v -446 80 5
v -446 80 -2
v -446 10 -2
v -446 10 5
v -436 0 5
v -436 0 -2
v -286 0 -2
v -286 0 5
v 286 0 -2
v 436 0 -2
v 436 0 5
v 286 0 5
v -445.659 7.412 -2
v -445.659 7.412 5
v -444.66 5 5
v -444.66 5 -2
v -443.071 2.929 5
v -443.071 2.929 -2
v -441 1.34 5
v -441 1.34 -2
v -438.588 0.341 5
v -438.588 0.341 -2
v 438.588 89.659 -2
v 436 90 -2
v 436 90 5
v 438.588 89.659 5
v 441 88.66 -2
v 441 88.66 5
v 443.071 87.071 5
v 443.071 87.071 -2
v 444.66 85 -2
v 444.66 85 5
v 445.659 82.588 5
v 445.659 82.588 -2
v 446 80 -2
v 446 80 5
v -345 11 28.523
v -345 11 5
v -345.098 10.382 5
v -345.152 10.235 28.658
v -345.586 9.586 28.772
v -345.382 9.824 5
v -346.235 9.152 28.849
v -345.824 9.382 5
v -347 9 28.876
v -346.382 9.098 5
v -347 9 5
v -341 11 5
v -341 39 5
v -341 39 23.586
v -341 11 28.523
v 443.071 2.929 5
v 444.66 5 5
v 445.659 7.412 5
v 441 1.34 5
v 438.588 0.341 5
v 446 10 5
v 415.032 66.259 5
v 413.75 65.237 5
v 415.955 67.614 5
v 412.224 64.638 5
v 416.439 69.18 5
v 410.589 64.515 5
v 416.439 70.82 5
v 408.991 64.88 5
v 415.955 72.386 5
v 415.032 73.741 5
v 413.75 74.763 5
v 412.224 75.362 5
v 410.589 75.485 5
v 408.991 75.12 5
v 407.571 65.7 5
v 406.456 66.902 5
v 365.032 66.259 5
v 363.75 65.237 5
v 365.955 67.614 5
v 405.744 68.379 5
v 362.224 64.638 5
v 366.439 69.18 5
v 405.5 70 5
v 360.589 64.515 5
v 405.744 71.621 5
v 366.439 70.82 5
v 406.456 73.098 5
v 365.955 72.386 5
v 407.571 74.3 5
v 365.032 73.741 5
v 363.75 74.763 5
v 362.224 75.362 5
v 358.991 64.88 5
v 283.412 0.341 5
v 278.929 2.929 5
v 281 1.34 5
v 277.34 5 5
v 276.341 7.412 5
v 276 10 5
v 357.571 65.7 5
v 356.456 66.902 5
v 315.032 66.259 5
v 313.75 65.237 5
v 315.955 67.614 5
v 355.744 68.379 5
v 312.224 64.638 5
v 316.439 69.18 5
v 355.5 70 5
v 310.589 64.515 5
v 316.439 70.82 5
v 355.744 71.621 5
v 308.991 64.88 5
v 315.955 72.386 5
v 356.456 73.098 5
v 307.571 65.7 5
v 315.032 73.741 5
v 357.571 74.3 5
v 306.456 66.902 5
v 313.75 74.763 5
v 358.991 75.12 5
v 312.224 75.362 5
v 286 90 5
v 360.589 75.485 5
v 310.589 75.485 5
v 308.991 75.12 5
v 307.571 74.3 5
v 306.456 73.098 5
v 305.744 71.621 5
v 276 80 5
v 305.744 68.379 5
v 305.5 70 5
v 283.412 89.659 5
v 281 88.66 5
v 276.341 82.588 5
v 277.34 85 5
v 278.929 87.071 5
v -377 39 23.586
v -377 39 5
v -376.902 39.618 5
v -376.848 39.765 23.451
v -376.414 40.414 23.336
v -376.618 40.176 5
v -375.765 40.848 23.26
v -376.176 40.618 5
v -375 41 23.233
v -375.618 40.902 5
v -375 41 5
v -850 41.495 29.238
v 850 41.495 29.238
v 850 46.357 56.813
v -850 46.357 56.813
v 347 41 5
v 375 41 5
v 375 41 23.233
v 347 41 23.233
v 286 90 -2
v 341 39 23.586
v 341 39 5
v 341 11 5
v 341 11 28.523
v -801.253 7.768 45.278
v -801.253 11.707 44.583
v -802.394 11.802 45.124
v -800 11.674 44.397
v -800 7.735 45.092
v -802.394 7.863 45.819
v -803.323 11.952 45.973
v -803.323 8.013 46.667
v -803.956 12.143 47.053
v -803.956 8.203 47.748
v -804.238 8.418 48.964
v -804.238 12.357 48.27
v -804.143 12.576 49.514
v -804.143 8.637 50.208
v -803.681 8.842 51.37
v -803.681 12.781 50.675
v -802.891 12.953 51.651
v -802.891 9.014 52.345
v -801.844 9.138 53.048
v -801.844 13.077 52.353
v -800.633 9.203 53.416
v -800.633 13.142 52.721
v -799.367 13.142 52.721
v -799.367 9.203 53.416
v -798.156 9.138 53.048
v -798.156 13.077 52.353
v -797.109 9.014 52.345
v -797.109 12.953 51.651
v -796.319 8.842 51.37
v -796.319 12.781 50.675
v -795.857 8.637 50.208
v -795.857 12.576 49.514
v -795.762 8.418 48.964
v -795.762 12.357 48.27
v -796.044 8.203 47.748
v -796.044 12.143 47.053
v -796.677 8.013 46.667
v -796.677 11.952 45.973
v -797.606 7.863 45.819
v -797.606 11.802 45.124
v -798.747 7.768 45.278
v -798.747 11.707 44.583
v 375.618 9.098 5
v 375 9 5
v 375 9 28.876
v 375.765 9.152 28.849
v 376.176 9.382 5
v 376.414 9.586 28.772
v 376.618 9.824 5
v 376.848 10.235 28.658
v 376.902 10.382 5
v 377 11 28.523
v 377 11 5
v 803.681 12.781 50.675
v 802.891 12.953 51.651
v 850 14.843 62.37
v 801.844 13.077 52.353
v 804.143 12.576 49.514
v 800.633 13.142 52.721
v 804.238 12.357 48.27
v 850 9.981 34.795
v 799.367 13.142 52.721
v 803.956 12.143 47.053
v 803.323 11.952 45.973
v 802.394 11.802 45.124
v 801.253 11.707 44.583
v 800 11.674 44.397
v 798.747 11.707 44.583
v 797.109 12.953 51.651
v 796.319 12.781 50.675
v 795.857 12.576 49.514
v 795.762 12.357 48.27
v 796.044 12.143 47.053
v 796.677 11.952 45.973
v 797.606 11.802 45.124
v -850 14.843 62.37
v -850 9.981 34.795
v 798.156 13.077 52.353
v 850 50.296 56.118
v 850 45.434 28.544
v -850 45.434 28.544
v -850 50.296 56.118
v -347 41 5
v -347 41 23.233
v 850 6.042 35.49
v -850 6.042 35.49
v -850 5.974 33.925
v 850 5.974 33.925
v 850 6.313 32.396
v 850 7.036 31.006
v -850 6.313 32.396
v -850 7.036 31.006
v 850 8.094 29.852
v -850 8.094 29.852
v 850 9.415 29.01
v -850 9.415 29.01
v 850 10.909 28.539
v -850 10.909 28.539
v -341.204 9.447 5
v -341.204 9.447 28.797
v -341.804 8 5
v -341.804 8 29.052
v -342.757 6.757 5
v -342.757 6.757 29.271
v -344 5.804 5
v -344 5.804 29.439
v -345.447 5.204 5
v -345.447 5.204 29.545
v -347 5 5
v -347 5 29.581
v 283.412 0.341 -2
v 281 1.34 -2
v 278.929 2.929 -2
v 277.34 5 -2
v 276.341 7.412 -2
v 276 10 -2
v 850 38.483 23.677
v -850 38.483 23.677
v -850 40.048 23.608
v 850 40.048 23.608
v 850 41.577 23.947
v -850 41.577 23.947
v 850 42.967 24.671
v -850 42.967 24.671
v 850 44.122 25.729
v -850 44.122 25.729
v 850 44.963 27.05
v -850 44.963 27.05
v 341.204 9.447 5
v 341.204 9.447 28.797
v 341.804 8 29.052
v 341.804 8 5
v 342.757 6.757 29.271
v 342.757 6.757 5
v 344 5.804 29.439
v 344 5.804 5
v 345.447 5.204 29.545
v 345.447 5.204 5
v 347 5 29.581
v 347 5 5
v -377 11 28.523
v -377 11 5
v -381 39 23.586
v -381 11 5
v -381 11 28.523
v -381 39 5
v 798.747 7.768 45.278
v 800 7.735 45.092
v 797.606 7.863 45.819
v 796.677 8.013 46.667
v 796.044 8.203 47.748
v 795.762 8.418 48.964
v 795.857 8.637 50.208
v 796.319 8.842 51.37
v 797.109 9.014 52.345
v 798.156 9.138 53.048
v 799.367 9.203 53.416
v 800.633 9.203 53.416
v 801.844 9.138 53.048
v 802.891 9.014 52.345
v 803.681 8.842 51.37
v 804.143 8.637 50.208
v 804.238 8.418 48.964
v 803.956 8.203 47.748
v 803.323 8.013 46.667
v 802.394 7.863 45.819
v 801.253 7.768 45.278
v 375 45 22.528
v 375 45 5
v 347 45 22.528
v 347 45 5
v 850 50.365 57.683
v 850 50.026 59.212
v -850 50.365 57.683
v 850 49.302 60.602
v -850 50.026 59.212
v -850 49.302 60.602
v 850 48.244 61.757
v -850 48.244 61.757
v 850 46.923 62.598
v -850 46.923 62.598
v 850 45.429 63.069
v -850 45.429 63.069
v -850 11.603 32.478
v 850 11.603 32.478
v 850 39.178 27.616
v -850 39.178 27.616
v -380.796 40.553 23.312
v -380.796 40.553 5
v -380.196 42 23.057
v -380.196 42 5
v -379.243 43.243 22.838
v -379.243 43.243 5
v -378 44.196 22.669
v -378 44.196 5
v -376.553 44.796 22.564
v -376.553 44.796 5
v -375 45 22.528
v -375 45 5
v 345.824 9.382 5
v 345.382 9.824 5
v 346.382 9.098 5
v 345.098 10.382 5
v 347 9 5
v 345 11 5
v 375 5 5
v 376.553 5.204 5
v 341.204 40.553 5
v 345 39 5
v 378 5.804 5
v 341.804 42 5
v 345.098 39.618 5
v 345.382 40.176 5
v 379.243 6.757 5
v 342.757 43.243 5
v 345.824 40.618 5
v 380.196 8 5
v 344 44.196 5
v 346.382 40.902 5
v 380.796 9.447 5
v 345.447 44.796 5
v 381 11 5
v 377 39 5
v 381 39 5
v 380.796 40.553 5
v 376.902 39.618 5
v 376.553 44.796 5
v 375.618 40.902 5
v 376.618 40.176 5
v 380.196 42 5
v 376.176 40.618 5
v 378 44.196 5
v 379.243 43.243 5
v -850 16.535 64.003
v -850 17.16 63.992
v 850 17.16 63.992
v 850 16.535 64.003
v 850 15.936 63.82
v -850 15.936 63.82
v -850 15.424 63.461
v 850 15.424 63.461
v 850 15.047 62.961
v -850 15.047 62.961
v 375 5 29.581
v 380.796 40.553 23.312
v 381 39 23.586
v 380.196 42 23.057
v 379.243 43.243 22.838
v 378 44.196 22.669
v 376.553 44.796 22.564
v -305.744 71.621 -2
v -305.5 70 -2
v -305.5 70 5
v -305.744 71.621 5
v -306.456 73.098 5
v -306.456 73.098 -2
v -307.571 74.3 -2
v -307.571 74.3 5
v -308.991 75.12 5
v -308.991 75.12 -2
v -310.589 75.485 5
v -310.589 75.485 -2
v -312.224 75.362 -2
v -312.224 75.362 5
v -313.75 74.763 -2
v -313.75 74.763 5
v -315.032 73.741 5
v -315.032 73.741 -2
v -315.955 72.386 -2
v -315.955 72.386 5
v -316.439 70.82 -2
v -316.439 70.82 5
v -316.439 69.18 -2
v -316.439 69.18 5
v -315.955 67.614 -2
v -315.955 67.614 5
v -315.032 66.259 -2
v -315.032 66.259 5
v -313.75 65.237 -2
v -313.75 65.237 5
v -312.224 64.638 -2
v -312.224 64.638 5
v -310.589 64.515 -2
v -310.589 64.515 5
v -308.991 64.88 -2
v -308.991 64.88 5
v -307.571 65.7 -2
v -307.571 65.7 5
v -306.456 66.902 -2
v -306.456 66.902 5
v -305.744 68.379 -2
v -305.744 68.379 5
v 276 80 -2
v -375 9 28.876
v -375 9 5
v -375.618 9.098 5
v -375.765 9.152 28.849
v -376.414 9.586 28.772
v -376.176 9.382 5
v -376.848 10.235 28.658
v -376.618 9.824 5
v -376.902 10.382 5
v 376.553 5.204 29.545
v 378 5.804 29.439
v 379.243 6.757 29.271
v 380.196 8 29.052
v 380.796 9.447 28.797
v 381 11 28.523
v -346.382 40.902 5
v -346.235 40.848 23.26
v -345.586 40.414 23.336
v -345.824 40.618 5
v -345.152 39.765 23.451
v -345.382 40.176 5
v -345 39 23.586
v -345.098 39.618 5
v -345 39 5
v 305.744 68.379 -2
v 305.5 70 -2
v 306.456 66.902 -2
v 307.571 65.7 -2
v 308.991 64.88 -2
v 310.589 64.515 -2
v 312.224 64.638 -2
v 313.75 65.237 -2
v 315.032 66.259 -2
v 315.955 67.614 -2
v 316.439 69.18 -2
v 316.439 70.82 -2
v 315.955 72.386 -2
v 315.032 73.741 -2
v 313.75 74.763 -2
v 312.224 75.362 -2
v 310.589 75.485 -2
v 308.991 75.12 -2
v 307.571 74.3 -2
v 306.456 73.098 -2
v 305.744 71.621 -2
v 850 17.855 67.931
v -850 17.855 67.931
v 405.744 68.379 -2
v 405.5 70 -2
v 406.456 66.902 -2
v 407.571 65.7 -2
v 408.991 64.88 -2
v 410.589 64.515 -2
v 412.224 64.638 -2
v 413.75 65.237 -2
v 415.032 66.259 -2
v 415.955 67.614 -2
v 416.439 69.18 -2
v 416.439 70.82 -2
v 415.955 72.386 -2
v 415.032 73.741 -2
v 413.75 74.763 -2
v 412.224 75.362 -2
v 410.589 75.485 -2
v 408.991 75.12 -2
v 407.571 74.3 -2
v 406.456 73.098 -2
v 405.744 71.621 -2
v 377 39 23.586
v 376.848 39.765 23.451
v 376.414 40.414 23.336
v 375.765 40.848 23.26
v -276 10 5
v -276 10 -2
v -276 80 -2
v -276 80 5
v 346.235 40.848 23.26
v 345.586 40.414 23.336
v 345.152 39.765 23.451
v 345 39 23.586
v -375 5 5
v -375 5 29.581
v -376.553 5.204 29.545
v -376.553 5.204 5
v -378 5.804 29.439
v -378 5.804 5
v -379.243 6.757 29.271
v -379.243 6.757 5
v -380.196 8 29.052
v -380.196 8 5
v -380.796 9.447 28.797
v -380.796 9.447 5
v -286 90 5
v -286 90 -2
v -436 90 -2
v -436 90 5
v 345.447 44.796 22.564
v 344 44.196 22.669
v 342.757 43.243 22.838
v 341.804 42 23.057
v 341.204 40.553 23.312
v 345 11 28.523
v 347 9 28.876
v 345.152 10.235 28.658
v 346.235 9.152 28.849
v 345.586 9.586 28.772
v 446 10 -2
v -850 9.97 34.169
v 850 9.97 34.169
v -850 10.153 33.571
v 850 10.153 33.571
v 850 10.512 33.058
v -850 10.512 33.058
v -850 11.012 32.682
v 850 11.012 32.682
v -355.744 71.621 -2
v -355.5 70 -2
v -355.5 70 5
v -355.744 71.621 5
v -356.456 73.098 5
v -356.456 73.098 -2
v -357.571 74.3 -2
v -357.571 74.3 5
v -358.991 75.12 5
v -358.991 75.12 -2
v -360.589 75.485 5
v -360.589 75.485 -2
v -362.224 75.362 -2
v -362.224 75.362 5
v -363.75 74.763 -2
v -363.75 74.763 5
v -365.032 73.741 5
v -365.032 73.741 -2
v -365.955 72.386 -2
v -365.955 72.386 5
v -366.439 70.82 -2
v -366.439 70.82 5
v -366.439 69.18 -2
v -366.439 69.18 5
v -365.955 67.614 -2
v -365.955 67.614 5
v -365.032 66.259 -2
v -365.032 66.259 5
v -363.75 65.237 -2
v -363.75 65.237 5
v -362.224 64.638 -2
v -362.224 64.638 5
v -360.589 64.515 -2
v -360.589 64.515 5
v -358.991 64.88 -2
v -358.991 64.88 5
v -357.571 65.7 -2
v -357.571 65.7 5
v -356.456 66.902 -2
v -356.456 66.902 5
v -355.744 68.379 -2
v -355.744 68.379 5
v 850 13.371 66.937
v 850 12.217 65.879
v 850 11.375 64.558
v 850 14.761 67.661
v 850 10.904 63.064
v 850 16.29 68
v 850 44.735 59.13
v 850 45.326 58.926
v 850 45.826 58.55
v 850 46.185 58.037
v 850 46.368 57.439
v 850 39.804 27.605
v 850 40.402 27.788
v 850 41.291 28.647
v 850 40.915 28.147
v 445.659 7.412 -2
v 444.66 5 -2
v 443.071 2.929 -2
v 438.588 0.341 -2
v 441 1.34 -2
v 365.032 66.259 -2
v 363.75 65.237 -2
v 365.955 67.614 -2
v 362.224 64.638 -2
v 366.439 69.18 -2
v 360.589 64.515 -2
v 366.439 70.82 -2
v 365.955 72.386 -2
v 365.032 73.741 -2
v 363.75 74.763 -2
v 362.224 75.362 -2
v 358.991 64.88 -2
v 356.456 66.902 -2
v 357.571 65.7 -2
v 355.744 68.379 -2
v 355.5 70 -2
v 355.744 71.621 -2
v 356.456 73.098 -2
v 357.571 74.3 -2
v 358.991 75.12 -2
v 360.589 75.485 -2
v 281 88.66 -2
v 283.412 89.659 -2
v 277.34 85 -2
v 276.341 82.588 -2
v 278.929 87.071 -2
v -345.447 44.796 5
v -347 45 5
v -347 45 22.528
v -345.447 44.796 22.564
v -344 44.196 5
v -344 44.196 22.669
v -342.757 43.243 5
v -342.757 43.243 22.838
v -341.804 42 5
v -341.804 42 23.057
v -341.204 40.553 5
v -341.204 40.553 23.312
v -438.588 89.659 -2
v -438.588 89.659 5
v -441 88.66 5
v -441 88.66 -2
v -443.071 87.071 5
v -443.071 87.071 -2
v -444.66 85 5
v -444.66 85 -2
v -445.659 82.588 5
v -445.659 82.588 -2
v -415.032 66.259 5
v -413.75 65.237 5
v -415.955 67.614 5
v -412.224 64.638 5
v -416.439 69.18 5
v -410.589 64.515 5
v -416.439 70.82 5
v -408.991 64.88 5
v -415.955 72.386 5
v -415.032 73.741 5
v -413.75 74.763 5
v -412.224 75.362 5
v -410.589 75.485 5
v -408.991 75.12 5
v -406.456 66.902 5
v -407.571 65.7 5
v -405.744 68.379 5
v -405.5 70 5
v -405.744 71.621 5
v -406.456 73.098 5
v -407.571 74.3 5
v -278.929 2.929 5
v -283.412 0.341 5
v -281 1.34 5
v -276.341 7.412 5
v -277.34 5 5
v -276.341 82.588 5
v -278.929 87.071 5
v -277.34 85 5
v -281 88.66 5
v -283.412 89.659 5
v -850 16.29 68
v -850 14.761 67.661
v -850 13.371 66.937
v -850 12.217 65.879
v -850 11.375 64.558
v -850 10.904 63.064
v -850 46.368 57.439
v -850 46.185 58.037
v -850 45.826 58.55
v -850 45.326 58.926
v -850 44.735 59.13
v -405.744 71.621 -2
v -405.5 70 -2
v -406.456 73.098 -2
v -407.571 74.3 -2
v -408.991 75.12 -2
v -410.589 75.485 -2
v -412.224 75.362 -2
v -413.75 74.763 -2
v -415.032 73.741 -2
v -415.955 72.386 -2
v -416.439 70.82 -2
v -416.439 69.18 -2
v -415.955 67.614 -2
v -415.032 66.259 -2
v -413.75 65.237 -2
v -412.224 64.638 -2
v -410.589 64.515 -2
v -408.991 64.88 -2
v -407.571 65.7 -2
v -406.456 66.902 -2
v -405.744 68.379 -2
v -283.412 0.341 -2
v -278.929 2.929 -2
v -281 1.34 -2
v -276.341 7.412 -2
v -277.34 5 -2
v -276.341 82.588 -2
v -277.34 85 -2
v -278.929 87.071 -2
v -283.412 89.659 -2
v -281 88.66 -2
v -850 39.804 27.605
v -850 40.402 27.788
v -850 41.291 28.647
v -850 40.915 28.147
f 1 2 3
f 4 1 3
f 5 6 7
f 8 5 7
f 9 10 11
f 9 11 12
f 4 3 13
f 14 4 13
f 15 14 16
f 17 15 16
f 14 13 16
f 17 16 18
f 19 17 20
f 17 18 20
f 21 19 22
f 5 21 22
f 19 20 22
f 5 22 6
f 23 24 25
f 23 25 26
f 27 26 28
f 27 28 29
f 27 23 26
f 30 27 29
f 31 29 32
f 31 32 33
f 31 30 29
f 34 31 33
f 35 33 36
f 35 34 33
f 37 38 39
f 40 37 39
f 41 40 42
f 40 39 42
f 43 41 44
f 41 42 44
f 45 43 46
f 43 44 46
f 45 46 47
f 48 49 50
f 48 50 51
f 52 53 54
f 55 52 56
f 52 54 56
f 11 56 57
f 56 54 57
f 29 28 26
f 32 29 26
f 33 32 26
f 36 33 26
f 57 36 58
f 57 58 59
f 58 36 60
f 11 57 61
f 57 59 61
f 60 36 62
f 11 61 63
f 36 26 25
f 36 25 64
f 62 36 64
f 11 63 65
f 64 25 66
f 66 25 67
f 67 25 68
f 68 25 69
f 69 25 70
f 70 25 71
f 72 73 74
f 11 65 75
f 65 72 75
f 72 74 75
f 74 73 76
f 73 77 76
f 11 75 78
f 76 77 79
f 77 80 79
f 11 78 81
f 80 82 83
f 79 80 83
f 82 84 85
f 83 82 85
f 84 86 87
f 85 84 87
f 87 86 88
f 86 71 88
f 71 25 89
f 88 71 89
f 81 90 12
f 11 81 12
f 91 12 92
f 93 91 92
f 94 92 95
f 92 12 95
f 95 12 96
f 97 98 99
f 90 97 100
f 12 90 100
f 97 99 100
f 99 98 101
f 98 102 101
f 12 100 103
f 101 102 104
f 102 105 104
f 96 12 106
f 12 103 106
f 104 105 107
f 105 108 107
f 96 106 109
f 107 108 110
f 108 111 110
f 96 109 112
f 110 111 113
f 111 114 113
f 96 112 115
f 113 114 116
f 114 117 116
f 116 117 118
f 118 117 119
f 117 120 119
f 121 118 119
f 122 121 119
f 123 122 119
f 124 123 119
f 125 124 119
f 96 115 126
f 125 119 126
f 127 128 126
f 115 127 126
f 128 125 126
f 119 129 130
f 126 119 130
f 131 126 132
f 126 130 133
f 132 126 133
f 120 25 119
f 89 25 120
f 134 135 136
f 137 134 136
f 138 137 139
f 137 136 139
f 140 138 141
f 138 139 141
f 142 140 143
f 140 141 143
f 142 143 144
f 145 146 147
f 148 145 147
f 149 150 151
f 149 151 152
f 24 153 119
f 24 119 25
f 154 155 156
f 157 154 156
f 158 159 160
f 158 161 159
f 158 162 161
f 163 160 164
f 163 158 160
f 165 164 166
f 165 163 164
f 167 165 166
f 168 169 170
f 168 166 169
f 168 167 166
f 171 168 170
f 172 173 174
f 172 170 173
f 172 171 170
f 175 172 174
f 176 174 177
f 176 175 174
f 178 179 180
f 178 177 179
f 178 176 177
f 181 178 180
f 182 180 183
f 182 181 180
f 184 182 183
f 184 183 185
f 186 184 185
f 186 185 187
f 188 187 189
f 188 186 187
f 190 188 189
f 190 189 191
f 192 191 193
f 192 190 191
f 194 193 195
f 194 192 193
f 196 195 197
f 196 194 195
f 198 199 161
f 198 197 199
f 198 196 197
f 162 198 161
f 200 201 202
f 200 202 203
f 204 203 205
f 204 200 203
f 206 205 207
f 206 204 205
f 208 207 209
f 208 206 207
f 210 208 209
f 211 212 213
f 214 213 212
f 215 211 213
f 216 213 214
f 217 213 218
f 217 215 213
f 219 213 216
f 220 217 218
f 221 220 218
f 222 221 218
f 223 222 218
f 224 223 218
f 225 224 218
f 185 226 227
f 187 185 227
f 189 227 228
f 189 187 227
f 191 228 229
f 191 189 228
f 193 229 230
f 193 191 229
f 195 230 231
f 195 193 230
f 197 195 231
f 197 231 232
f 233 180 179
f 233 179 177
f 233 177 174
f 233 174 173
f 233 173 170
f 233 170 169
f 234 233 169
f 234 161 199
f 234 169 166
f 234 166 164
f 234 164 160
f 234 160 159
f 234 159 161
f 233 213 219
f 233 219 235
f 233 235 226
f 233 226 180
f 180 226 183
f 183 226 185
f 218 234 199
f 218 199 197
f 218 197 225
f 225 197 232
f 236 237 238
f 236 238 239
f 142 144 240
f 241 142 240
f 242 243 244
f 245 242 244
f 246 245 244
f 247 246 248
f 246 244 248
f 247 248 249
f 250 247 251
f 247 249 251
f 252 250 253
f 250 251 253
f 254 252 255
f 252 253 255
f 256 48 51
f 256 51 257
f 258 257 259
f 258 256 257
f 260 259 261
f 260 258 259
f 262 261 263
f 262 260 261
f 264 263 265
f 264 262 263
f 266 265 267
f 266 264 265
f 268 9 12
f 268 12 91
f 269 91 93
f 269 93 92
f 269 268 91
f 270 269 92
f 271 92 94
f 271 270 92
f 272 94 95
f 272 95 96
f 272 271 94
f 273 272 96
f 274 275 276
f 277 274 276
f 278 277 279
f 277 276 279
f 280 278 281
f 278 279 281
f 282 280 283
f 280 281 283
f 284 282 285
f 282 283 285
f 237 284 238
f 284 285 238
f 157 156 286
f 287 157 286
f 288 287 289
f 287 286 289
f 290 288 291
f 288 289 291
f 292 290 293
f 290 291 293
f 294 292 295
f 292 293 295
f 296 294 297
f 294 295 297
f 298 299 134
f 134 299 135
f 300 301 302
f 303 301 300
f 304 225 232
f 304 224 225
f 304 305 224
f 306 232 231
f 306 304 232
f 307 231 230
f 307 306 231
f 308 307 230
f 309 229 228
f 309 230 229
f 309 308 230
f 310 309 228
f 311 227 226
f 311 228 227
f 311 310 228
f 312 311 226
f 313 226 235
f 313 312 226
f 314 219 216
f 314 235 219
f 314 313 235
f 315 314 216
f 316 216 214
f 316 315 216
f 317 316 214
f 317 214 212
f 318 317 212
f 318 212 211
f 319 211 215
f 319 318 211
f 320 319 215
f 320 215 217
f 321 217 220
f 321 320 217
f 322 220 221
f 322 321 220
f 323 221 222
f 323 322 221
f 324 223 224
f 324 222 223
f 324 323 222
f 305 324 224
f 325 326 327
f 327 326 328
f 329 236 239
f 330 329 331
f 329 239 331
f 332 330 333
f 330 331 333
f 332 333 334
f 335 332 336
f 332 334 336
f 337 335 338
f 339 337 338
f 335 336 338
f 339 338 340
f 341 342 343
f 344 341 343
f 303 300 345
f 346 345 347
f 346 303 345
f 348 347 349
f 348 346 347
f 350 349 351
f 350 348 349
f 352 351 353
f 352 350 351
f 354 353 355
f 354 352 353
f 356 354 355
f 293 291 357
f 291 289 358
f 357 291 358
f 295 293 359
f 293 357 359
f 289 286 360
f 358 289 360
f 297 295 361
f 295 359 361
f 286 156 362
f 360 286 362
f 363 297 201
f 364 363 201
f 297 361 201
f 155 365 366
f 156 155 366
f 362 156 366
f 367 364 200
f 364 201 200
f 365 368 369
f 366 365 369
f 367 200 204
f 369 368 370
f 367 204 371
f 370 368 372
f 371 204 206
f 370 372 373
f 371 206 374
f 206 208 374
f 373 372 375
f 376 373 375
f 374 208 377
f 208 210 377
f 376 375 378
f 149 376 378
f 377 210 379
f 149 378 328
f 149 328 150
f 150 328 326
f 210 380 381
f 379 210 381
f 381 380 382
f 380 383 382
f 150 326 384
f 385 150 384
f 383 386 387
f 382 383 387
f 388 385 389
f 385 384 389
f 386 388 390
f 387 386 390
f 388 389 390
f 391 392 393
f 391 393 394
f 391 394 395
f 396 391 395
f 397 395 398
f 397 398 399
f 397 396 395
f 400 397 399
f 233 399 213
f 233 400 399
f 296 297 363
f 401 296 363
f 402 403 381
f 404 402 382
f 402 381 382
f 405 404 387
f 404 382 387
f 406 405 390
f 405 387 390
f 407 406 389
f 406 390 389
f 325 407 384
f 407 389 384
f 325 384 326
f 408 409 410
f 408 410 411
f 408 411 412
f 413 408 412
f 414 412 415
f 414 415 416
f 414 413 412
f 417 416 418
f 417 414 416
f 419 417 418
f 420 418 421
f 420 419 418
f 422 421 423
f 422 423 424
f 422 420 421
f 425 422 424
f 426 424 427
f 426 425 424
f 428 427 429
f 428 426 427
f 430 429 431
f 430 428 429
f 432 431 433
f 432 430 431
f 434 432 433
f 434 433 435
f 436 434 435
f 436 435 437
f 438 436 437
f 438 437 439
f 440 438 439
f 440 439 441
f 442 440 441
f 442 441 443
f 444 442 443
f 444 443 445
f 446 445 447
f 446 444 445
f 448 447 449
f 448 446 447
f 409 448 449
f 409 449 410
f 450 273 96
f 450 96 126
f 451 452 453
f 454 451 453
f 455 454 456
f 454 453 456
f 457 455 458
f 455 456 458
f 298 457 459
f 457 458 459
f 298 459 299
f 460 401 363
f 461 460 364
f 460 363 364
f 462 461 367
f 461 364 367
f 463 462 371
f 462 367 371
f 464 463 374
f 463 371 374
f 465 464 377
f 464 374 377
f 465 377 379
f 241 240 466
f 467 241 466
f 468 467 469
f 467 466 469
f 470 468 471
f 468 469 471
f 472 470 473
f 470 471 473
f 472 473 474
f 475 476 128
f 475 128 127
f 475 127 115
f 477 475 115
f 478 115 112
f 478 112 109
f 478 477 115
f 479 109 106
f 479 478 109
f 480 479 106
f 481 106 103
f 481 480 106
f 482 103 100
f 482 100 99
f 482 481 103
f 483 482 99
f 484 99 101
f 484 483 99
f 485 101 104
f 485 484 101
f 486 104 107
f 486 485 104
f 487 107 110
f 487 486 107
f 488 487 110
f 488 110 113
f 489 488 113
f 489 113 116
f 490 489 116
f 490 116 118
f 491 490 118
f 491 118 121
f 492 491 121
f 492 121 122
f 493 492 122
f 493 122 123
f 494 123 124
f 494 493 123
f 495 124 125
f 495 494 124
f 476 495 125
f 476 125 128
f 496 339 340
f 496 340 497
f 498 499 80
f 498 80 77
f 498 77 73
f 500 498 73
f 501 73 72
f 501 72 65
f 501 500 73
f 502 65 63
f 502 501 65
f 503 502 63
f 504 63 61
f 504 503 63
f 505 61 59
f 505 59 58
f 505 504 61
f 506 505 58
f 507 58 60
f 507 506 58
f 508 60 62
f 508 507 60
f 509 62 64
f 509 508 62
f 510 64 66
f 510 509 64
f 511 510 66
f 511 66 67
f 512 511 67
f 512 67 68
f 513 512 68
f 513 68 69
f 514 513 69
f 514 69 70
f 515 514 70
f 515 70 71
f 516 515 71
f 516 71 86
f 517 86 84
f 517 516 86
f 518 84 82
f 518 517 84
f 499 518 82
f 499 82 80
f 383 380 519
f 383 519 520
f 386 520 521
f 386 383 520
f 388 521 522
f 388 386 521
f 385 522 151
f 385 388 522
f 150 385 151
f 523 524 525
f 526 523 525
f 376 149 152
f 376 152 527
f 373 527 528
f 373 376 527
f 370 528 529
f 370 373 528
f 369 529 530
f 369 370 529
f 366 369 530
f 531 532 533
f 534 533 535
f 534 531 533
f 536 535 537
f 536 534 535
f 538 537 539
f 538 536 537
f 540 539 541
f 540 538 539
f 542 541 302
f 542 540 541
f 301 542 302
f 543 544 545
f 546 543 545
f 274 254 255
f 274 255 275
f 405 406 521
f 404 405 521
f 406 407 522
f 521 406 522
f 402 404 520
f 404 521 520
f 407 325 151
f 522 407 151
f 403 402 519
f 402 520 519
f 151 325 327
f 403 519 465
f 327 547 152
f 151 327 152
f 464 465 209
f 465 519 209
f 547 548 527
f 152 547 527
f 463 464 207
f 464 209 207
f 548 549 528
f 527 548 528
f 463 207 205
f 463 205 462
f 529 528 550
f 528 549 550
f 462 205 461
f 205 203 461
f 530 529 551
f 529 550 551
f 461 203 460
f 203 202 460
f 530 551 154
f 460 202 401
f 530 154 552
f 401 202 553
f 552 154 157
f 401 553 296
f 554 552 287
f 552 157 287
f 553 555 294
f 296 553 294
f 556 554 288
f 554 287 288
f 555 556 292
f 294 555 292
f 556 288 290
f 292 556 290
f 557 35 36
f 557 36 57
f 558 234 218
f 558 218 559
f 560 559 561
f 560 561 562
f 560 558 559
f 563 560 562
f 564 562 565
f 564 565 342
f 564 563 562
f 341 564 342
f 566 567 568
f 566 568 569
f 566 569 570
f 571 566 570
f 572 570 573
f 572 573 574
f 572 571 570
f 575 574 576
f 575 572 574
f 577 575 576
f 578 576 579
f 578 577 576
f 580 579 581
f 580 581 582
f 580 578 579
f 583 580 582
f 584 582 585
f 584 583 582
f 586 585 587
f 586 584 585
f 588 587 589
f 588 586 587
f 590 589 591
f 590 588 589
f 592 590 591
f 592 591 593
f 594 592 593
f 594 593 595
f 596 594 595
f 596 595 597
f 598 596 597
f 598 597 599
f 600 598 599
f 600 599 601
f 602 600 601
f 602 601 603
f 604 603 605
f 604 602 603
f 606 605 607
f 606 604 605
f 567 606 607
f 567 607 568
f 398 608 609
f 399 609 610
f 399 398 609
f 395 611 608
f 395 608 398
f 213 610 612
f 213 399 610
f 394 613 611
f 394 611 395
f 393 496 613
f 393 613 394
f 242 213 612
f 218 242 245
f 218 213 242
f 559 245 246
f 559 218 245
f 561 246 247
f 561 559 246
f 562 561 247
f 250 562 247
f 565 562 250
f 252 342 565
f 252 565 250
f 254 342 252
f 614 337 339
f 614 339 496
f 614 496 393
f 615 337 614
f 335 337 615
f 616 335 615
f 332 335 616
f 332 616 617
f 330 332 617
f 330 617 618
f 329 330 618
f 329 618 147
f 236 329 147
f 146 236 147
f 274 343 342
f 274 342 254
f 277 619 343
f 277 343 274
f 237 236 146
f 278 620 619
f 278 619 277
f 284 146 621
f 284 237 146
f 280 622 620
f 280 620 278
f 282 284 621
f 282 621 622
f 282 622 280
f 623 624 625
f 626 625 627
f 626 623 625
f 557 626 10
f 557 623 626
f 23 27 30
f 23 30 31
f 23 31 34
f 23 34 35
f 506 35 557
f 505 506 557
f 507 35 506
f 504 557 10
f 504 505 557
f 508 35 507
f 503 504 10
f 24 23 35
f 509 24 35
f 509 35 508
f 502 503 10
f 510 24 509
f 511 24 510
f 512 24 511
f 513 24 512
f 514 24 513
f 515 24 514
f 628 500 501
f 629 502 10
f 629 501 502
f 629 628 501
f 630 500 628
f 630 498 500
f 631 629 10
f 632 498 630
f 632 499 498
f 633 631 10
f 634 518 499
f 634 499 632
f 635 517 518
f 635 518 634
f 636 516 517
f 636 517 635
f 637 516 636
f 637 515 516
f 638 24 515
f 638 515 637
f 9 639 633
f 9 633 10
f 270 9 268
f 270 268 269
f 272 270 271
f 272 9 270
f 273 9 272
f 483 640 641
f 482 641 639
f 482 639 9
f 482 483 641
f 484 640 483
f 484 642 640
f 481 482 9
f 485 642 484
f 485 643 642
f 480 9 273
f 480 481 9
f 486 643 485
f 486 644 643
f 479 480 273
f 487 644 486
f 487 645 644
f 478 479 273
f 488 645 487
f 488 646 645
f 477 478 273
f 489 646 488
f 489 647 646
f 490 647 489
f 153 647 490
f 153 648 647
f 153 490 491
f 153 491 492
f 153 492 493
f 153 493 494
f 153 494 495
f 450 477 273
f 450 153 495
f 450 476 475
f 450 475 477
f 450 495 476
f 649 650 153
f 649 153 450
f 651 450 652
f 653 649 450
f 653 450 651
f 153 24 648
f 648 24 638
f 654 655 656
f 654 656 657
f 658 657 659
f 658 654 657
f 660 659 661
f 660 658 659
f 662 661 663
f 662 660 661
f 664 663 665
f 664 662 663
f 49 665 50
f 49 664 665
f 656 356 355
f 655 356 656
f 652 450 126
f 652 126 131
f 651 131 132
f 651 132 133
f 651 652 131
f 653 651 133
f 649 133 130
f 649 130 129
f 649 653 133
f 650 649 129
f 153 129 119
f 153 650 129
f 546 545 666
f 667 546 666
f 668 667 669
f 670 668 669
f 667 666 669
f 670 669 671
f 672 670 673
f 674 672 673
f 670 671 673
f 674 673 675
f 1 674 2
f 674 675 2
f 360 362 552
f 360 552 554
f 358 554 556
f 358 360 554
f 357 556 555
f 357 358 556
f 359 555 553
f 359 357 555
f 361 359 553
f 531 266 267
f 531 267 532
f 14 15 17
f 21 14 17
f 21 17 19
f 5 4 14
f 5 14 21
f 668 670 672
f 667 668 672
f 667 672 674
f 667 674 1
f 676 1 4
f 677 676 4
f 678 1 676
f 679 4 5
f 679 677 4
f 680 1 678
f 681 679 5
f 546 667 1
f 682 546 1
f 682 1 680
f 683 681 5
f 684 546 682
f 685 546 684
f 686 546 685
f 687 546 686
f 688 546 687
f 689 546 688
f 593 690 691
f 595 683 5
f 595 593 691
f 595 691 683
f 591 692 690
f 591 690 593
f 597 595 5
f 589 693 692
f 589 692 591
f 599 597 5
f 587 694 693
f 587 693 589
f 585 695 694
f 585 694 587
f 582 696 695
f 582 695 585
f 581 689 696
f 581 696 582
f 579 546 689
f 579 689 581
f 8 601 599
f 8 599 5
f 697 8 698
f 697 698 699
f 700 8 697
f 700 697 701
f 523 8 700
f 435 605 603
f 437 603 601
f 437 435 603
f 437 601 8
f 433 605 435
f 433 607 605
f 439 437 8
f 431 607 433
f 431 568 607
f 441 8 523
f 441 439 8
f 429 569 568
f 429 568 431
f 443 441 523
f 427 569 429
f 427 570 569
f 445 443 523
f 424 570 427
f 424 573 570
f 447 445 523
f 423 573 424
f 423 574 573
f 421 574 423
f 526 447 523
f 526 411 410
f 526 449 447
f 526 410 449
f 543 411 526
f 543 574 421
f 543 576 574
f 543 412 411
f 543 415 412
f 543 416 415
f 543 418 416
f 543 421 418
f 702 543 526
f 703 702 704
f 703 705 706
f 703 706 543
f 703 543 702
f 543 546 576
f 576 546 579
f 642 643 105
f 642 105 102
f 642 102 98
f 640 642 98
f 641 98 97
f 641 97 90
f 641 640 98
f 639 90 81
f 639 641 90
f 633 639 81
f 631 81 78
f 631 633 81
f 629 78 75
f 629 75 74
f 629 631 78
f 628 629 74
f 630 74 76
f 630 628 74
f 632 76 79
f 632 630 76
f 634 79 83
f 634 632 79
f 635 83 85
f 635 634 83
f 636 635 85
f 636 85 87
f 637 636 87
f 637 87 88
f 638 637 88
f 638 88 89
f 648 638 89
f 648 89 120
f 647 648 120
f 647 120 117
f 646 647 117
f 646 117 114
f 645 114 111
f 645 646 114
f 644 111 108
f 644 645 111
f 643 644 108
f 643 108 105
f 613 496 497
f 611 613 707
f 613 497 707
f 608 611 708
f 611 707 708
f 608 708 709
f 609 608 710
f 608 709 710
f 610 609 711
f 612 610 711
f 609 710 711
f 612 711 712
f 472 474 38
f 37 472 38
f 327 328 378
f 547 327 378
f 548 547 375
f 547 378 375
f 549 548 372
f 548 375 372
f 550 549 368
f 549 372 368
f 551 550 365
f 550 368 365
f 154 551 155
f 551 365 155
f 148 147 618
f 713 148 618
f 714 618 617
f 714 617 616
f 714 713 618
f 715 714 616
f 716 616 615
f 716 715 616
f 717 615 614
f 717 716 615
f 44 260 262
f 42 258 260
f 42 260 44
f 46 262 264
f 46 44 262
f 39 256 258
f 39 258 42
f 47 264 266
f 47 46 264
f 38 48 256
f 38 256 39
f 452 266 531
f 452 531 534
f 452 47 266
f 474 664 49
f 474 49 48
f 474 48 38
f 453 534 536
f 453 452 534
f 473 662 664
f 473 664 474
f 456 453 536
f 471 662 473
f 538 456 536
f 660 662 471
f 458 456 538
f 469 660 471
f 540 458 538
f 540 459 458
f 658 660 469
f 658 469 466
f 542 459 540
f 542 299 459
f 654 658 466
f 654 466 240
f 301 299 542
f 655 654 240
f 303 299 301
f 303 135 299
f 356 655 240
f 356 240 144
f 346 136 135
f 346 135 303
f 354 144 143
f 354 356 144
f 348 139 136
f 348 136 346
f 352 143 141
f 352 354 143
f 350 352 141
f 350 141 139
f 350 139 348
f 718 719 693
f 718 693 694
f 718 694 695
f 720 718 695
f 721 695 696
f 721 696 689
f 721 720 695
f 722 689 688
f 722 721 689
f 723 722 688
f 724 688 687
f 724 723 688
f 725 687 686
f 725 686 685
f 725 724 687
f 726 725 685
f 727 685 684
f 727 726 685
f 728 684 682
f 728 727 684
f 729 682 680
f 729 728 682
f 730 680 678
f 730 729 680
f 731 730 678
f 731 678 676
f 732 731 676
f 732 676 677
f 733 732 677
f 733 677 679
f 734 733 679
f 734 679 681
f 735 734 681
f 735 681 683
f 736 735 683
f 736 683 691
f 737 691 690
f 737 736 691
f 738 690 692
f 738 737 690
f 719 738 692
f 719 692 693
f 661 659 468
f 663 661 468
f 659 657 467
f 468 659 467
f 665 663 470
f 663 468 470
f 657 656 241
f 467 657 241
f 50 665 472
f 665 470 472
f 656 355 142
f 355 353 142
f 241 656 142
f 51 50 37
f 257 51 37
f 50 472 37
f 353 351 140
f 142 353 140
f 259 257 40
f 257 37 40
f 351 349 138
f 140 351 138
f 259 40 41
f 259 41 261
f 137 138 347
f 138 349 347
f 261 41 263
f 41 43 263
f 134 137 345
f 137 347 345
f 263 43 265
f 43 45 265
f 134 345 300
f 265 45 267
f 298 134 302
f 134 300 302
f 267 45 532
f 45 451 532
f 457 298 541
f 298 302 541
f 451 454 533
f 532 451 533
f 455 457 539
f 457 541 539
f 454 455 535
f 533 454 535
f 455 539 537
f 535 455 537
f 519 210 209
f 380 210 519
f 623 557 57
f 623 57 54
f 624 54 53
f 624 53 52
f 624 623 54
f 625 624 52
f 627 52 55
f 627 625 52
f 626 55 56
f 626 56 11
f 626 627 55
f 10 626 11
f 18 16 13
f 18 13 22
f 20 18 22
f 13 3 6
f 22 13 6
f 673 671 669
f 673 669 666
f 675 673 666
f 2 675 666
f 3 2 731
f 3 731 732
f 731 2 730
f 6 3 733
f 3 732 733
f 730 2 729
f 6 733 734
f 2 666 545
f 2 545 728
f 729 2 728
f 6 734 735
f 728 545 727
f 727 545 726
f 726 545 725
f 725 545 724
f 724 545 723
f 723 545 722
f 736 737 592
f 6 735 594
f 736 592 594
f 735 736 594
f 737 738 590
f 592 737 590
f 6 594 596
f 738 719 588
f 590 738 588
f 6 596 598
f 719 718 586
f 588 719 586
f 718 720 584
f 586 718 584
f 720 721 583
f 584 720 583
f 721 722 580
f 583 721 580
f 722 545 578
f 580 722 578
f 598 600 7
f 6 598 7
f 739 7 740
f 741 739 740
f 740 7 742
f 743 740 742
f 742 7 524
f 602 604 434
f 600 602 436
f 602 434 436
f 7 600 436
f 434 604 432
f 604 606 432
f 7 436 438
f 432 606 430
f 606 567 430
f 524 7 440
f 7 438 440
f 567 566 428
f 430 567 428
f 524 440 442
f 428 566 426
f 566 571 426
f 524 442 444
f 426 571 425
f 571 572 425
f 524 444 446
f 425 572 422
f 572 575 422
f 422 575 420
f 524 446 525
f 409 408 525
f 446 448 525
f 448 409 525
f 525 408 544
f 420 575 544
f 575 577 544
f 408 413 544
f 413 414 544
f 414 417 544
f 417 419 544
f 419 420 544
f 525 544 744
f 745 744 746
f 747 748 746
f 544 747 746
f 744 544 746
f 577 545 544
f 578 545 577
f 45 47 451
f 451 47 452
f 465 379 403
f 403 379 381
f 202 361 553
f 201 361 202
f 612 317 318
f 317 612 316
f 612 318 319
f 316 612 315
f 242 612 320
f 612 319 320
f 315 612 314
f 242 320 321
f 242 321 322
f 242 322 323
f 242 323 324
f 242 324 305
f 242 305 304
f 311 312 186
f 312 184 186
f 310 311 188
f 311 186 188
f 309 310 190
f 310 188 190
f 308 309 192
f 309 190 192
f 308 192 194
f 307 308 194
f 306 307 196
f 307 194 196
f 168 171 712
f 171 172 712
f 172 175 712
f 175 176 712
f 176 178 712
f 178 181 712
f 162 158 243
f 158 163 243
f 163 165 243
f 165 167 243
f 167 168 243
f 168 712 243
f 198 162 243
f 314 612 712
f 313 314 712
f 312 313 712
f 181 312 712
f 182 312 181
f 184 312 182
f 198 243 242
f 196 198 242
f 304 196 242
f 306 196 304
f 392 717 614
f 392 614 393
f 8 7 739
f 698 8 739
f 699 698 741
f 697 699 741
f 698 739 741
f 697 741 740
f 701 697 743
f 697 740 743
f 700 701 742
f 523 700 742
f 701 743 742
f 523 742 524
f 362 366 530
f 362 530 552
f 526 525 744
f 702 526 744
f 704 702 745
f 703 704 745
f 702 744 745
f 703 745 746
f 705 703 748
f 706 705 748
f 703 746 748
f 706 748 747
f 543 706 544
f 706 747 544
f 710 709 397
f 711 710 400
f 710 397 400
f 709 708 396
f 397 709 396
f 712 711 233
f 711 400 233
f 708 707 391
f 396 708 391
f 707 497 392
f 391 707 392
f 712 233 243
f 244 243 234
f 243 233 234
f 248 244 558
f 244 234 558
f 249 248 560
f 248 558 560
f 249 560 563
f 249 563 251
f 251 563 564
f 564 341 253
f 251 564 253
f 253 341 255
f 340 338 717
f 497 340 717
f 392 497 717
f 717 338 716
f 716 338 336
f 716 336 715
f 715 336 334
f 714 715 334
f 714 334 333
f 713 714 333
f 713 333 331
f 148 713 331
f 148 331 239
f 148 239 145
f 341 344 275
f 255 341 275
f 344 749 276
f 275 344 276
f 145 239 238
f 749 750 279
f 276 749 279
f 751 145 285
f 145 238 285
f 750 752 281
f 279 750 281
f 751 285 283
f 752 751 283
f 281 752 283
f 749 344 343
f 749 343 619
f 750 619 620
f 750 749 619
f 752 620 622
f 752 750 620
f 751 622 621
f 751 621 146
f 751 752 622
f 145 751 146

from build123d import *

# Parameters (mm, degrees)
DODANIE_WYCI_GNI_CIE1_DEPTH        = 5
DODANIE_WYCI_GNI_CIE1_DEPTH_BACK   = 2
SZKIC1_R                           = 5.5
DODANIE_WYCI_GNI_CIE1_2_DEPTH      = 5
DODANIE_WYCI_GNI_CIE1_2_DEPTH_BACK = 2
DODANIE_WYCI_GNI_CIE2_DEPTH        = 850
DODANIE_WYCI_GNI_CIE2_DEPTH_BACK   = 850
DODANIE_WYCI_GNI_CIE3_REACH        = 859.072
OTW_R_GWINTOWANY_M101_AT_2_COUNT   = 2
OTW_R_GWINTOWANY_M101_AT_2_PITCH   = 1600


with BuildPart() as part:
    # Szkic1 → Dodanie-wyciągnięcie1 (new, two sides: drawn at the far end of the back side and taken through both)
    with BuildSketch(Plane.XY.offset(-DODANIE_WYCI_GNI_CIE1_DEPTH_BACK)):
        with BuildLine():
            Line((-436, 0), (-286, 0))
            ThreePointArc((-286, 0), (-278.928932188, 2.928932188), (-276, 10))
            Line((-276, 10), (-276, 80))
            ThreePointArc((-276, 80), (-278.928932188, 87.071067812), (-286, 90))
            Line((-286, 90), (-436, 90))
            ThreePointArc((-436, 90), (-443.071067812, 87.071067812), (-446, 80))
            Line((-446, 80), (-446, 10))
            ThreePointArc((-446, 10), (-443.071067812, 2.928932188), (-436, 0))
        make_face()
        with Locations((-411, 70)):
            Circle(SZKIC1_R, mode=Mode.SUBTRACT)
        with Locations((-361, 70)):
            Circle(SZKIC1_R, mode=Mode.SUBTRACT)
        with Locations((-311, 70)):
            Circle(SZKIC1_R, mode=Mode.SUBTRACT)
    extrude(amount=DODANIE_WYCI_GNI_CIE1_DEPTH + DODANIE_WYCI_GNI_CIE1_DEPTH_BACK)


with BuildPart() as body_2:
    # Szkic1 → Dodanie-wyci_gni_cie1 2 (new, two sides: drawn at the far end of the back side and taken through both)
    with BuildSketch(Plane.XY.offset(-DODANIE_WYCI_GNI_CIE1_2_DEPTH_BACK)):
        with BuildLine():
            Line((276, 10), (276, 80))
            ThreePointArc((276, 80), (278.928932188, 87.071067812), (286, 90))
            Line((286, 90), (436, 90))
            ThreePointArc((436, 90), (443.071067812, 87.071067812), (446, 80))
            Line((446, 80), (446, 10))
            ThreePointArc((446, 10), (443.071067812, 2.928932188), (436, 0))
            Line((436, 0), (286, 0))
            ThreePointArc((286, 0), (278.928932188, 2.928932188), (276, 10))
        make_face()
        with Locations(Location((311, 70, 0), (0, 0, 180))):
            Circle(SZKIC1_R, mode=Mode.SUBTRACT)
        with Locations(Location((361, 70, 0), (0, 0, 180))):
            Circle(SZKIC1_R, mode=Mode.SUBTRACT)
        with Locations(Location((411, 70, 0), (0, 0, 180))):
            Circle(SZKIC1_R, mode=Mode.SUBTRACT)
    extrude(amount=DODANIE_WYCI_GNI_CIE1_2_DEPTH + DODANIE_WYCI_GNI_CIE1_2_DEPTH_BACK)


with BuildPart() as body_3:
    # Szkic2 → Dodanie-wyciągnięcie2 (new, two sides: drawn at the far end of the back side and taken through both)
    with BuildSketch(Plane(origin=(0, 0, 0), x_dir=(0, 0, -1), z_dir=(1, 0, 0)).offset(-DODANIE_WYCI_GNI_CIE2_DEPTH_BACK)):
        with BuildLine():
            Line((-28.543754975, 45.434199186), (-56.118372059, 50.296348161))
            ThreePointArc((-56.118372059, 50.296348161), (-60.601719743, 49.302413909), (-63.069107643, 45.429390709))
            Line((-63.069107643, 45.429390709), (-67.931256618, 17.854773625))
            ThreePointArc((-67.931256618, 17.854773625), (-66.937322366, 13.371425941), (-63.064299166, 10.904038041))
            Line((-63.064299166, 10.904038041), (-35.489682082, 6.041889066))
            ThreePointArc((-35.489682082, 6.041889066), (-31.006334398, 7.035823318), (-28.538946498, 10.908846518))
            Line((-28.538946498, 10.908846518), (-23.676797523, 38.483463602))
            ThreePointArc((-23.676797523, 38.483463602), (-24.670731775, 42.966811287), (-28.543754975, 45.434199186))
        make_face()
        with BuildLine():
            Line((-29.238347686, 41.494968174), (-56.81296477, 46.357117149))
            ThreePointArc((-56.81296477, 46.357117149), (-58.307413998, 46.025805732), (-59.129876631, 44.734797998))
            Line((-59.129876631, 44.734797998), (-63.992025606, 17.160180914))
            ThreePointArc((-63.992025606, 17.160180914), (-63.660714189, 15.665731686), (-62.369706455, 14.843269053))
            Line((-62.369706455, 14.843269053), (-34.795089371, 9.981120078))
            ThreePointArc((-34.795089371, 9.981120078), (-33.300640143, 10.312431495), (-32.47817751, 11.603439229))
            Line((-32.47817751, 11.603439229), (-27.616028535, 39.178056313))
            ThreePointArc((-27.616028535, 39.178056313), (-27.947339952, 40.672505541), (-29.238347686, 41.494968174))
        make_face(mode=Mode.SUBTRACT)
    extrude(amount=DODANIE_WYCI_GNI_CIE2_DEPTH + DODANIE_WYCI_GNI_CIE2_DEPTH_BACK)

    # Szkic5 → Otwór gwintowany M101 (revolve, cut)
    with BuildSketch(Plane(origin=(-800, 8.472963553, 49.276990624), x_dir=(0, -0.17364817766693064, -0.9848077530122081), z_dir=(1, 0, 0))):
        Polygon((0, 0), (0, 30.053657631), (4.25, 27.5), (4.25, 0), align=None)
    otw_r_gwintowany_m101 = revolve(axis=Axis((-800, 2.219434322, 50.379656552), (0, 0.9848077530122081, -0.17364817766693066)), mode=Mode.SUBTRACT)

    # Otwór gwintowany M101 at 2: Otwór gwintowany M101 ×2
    with Locations(*[(i * OTW_R_GWINTOWANY_M101_AT_2_PITCH, 0, 0) for i in range(1, OTW_R_GWINTOWANY_M101_AT_2_COUNT)]):
        add(otw_r_gwintowany_m101, mode=Mode.SUBTRACT)


with BuildPart() as body_4:
    # Dodanie-wyciągnięcie3: up to this plane
    dodanie_wyci_gni_cie3_end = Plane(origin=(-850, 10.908846518, 28.538946498), z_dir=(0, -0.17364817766693066, -0.984807753012208))
    # Szkic3 → Dodanie-wyciągnięcie3 (new, up to the surface)
    with BuildSketch(Plane(origin=(0, 0, 5), x_dir=(-1, 0, 0), z_dir=(0, 0, -1)), mode=Mode.PRIVATE) as dodanie_wyci_gni_cie3_sk1:
        with BuildLine():
            Line((375, 45), (347, 45))
            ThreePointArc((347, 45), (342.757359313, 43.242640687), (341, 39))
            Line((341, 39), (341, 11))
            ThreePointArc((341, 11), (342.757359313, 6.757359313), (347, 5))
            Line((347, 5), (375, 5))
            ThreePointArc((375, 5), (379.242640687, 6.757359313), (381, 11))
            Line((381, 11), (381, 39))
            ThreePointArc((381, 39), (379.242640687, 43.242640687), (375, 45))
        make_face()
        with BuildLine():
            Line((375, 41), (347, 41))
            ThreePointArc((347, 41), (345.585786438, 40.414213562), (345, 39))
            Line((345, 39), (345, 11))
            ThreePointArc((345, 11), (345.585786438, 9.585786438), (347, 9))
            Line((347, 9), (375, 9))
            ThreePointArc((375, 9), (376.414213562, 9.585786438), (377, 11))
            Line((377, 11), (377, 39))
            ThreePointArc((377, 39), (376.414213562, 40.414213562), (375, 41))
        make_face(mode=Mode.SUBTRACT)
    dodanie_wyci_gni_cie3_tool1 = split(extrude(dodanie_wyci_gni_cie3_sk1.sketch, amount=-DODANIE_WYCI_GNI_CIE3_REACH, mode=Mode.PRIVATE), bisect_by=dodanie_wyci_gni_cie3_end, keep=Keep.BOTH, mode=Mode.PRIVATE)
    add(dodanie_wyci_gni_cie3_tool1.solids().sort_by_distance((-361, 44.434315, 5))[0])
    # Szkic3 → Dodanie-wyciągnięcie3 (new, up to the surface)
    with BuildSketch(Plane(origin=(0, 0, 5), x_dir=(-1, 0, 0), z_dir=(0, 0, -1)), mode=Mode.PRIVATE) as dodanie_wyci_gni_cie3_sk2:
        with BuildLine():
            Line((-381, 11), (-381, 39))
            ThreePointArc((-381, 39), (-379.242640687, 43.242640687), (-375, 45))
            Line((-375, 45), (-347, 45))
            ThreePointArc((-347, 45), (-342.757359313, 43.242640687), (-341, 39))
            Line((-341, 39), (-341, 11))
            ThreePointArc((-341, 11), (-342.757359313, 6.757359313), (-347, 5))
            Line((-347, 5), (-375, 5))
            ThreePointArc((-375, 5), (-379.242640687, 6.757359313), (-381, 11))
        make_face()
        with BuildLine():
            Line((-377, 11), (-377, 39))
            ThreePointArc((-377, 39), (-376.414213562, 40.414213562), (-375, 41))
            Line((-375, 41), (-347, 41))
            ThreePointArc((-347, 41), (-345.585786438, 40.414213562), (-345, 39))
            Line((-345, 39), (-345, 11))
            ThreePointArc((-345, 11), (-345.585786438, 9.585786438), (-347, 9))
            Line((-347, 9), (-375, 9))
            ThreePointArc((-375, 9), (-376.414213562, 9.585786438), (-377, 11))
        make_face(mode=Mode.SUBTRACT)
    dodanie_wyci_gni_cie3_tool2 = split(extrude(dodanie_wyci_gni_cie3_sk2.sketch, amount=-DODANIE_WYCI_GNI_CIE3_REACH, mode=Mode.PRIVATE), bisect_by=dodanie_wyci_gni_cie3_end, keep=Keep.BOTH, mode=Mode.PRIVATE)
    add(dodanie_wyci_gni_cie3_tool2.solids().sort_by_distance((378.842641, 7.157359, 5))[0])


solid = Compound([part.part, body_2.part, body_3.part, body_4.part])
